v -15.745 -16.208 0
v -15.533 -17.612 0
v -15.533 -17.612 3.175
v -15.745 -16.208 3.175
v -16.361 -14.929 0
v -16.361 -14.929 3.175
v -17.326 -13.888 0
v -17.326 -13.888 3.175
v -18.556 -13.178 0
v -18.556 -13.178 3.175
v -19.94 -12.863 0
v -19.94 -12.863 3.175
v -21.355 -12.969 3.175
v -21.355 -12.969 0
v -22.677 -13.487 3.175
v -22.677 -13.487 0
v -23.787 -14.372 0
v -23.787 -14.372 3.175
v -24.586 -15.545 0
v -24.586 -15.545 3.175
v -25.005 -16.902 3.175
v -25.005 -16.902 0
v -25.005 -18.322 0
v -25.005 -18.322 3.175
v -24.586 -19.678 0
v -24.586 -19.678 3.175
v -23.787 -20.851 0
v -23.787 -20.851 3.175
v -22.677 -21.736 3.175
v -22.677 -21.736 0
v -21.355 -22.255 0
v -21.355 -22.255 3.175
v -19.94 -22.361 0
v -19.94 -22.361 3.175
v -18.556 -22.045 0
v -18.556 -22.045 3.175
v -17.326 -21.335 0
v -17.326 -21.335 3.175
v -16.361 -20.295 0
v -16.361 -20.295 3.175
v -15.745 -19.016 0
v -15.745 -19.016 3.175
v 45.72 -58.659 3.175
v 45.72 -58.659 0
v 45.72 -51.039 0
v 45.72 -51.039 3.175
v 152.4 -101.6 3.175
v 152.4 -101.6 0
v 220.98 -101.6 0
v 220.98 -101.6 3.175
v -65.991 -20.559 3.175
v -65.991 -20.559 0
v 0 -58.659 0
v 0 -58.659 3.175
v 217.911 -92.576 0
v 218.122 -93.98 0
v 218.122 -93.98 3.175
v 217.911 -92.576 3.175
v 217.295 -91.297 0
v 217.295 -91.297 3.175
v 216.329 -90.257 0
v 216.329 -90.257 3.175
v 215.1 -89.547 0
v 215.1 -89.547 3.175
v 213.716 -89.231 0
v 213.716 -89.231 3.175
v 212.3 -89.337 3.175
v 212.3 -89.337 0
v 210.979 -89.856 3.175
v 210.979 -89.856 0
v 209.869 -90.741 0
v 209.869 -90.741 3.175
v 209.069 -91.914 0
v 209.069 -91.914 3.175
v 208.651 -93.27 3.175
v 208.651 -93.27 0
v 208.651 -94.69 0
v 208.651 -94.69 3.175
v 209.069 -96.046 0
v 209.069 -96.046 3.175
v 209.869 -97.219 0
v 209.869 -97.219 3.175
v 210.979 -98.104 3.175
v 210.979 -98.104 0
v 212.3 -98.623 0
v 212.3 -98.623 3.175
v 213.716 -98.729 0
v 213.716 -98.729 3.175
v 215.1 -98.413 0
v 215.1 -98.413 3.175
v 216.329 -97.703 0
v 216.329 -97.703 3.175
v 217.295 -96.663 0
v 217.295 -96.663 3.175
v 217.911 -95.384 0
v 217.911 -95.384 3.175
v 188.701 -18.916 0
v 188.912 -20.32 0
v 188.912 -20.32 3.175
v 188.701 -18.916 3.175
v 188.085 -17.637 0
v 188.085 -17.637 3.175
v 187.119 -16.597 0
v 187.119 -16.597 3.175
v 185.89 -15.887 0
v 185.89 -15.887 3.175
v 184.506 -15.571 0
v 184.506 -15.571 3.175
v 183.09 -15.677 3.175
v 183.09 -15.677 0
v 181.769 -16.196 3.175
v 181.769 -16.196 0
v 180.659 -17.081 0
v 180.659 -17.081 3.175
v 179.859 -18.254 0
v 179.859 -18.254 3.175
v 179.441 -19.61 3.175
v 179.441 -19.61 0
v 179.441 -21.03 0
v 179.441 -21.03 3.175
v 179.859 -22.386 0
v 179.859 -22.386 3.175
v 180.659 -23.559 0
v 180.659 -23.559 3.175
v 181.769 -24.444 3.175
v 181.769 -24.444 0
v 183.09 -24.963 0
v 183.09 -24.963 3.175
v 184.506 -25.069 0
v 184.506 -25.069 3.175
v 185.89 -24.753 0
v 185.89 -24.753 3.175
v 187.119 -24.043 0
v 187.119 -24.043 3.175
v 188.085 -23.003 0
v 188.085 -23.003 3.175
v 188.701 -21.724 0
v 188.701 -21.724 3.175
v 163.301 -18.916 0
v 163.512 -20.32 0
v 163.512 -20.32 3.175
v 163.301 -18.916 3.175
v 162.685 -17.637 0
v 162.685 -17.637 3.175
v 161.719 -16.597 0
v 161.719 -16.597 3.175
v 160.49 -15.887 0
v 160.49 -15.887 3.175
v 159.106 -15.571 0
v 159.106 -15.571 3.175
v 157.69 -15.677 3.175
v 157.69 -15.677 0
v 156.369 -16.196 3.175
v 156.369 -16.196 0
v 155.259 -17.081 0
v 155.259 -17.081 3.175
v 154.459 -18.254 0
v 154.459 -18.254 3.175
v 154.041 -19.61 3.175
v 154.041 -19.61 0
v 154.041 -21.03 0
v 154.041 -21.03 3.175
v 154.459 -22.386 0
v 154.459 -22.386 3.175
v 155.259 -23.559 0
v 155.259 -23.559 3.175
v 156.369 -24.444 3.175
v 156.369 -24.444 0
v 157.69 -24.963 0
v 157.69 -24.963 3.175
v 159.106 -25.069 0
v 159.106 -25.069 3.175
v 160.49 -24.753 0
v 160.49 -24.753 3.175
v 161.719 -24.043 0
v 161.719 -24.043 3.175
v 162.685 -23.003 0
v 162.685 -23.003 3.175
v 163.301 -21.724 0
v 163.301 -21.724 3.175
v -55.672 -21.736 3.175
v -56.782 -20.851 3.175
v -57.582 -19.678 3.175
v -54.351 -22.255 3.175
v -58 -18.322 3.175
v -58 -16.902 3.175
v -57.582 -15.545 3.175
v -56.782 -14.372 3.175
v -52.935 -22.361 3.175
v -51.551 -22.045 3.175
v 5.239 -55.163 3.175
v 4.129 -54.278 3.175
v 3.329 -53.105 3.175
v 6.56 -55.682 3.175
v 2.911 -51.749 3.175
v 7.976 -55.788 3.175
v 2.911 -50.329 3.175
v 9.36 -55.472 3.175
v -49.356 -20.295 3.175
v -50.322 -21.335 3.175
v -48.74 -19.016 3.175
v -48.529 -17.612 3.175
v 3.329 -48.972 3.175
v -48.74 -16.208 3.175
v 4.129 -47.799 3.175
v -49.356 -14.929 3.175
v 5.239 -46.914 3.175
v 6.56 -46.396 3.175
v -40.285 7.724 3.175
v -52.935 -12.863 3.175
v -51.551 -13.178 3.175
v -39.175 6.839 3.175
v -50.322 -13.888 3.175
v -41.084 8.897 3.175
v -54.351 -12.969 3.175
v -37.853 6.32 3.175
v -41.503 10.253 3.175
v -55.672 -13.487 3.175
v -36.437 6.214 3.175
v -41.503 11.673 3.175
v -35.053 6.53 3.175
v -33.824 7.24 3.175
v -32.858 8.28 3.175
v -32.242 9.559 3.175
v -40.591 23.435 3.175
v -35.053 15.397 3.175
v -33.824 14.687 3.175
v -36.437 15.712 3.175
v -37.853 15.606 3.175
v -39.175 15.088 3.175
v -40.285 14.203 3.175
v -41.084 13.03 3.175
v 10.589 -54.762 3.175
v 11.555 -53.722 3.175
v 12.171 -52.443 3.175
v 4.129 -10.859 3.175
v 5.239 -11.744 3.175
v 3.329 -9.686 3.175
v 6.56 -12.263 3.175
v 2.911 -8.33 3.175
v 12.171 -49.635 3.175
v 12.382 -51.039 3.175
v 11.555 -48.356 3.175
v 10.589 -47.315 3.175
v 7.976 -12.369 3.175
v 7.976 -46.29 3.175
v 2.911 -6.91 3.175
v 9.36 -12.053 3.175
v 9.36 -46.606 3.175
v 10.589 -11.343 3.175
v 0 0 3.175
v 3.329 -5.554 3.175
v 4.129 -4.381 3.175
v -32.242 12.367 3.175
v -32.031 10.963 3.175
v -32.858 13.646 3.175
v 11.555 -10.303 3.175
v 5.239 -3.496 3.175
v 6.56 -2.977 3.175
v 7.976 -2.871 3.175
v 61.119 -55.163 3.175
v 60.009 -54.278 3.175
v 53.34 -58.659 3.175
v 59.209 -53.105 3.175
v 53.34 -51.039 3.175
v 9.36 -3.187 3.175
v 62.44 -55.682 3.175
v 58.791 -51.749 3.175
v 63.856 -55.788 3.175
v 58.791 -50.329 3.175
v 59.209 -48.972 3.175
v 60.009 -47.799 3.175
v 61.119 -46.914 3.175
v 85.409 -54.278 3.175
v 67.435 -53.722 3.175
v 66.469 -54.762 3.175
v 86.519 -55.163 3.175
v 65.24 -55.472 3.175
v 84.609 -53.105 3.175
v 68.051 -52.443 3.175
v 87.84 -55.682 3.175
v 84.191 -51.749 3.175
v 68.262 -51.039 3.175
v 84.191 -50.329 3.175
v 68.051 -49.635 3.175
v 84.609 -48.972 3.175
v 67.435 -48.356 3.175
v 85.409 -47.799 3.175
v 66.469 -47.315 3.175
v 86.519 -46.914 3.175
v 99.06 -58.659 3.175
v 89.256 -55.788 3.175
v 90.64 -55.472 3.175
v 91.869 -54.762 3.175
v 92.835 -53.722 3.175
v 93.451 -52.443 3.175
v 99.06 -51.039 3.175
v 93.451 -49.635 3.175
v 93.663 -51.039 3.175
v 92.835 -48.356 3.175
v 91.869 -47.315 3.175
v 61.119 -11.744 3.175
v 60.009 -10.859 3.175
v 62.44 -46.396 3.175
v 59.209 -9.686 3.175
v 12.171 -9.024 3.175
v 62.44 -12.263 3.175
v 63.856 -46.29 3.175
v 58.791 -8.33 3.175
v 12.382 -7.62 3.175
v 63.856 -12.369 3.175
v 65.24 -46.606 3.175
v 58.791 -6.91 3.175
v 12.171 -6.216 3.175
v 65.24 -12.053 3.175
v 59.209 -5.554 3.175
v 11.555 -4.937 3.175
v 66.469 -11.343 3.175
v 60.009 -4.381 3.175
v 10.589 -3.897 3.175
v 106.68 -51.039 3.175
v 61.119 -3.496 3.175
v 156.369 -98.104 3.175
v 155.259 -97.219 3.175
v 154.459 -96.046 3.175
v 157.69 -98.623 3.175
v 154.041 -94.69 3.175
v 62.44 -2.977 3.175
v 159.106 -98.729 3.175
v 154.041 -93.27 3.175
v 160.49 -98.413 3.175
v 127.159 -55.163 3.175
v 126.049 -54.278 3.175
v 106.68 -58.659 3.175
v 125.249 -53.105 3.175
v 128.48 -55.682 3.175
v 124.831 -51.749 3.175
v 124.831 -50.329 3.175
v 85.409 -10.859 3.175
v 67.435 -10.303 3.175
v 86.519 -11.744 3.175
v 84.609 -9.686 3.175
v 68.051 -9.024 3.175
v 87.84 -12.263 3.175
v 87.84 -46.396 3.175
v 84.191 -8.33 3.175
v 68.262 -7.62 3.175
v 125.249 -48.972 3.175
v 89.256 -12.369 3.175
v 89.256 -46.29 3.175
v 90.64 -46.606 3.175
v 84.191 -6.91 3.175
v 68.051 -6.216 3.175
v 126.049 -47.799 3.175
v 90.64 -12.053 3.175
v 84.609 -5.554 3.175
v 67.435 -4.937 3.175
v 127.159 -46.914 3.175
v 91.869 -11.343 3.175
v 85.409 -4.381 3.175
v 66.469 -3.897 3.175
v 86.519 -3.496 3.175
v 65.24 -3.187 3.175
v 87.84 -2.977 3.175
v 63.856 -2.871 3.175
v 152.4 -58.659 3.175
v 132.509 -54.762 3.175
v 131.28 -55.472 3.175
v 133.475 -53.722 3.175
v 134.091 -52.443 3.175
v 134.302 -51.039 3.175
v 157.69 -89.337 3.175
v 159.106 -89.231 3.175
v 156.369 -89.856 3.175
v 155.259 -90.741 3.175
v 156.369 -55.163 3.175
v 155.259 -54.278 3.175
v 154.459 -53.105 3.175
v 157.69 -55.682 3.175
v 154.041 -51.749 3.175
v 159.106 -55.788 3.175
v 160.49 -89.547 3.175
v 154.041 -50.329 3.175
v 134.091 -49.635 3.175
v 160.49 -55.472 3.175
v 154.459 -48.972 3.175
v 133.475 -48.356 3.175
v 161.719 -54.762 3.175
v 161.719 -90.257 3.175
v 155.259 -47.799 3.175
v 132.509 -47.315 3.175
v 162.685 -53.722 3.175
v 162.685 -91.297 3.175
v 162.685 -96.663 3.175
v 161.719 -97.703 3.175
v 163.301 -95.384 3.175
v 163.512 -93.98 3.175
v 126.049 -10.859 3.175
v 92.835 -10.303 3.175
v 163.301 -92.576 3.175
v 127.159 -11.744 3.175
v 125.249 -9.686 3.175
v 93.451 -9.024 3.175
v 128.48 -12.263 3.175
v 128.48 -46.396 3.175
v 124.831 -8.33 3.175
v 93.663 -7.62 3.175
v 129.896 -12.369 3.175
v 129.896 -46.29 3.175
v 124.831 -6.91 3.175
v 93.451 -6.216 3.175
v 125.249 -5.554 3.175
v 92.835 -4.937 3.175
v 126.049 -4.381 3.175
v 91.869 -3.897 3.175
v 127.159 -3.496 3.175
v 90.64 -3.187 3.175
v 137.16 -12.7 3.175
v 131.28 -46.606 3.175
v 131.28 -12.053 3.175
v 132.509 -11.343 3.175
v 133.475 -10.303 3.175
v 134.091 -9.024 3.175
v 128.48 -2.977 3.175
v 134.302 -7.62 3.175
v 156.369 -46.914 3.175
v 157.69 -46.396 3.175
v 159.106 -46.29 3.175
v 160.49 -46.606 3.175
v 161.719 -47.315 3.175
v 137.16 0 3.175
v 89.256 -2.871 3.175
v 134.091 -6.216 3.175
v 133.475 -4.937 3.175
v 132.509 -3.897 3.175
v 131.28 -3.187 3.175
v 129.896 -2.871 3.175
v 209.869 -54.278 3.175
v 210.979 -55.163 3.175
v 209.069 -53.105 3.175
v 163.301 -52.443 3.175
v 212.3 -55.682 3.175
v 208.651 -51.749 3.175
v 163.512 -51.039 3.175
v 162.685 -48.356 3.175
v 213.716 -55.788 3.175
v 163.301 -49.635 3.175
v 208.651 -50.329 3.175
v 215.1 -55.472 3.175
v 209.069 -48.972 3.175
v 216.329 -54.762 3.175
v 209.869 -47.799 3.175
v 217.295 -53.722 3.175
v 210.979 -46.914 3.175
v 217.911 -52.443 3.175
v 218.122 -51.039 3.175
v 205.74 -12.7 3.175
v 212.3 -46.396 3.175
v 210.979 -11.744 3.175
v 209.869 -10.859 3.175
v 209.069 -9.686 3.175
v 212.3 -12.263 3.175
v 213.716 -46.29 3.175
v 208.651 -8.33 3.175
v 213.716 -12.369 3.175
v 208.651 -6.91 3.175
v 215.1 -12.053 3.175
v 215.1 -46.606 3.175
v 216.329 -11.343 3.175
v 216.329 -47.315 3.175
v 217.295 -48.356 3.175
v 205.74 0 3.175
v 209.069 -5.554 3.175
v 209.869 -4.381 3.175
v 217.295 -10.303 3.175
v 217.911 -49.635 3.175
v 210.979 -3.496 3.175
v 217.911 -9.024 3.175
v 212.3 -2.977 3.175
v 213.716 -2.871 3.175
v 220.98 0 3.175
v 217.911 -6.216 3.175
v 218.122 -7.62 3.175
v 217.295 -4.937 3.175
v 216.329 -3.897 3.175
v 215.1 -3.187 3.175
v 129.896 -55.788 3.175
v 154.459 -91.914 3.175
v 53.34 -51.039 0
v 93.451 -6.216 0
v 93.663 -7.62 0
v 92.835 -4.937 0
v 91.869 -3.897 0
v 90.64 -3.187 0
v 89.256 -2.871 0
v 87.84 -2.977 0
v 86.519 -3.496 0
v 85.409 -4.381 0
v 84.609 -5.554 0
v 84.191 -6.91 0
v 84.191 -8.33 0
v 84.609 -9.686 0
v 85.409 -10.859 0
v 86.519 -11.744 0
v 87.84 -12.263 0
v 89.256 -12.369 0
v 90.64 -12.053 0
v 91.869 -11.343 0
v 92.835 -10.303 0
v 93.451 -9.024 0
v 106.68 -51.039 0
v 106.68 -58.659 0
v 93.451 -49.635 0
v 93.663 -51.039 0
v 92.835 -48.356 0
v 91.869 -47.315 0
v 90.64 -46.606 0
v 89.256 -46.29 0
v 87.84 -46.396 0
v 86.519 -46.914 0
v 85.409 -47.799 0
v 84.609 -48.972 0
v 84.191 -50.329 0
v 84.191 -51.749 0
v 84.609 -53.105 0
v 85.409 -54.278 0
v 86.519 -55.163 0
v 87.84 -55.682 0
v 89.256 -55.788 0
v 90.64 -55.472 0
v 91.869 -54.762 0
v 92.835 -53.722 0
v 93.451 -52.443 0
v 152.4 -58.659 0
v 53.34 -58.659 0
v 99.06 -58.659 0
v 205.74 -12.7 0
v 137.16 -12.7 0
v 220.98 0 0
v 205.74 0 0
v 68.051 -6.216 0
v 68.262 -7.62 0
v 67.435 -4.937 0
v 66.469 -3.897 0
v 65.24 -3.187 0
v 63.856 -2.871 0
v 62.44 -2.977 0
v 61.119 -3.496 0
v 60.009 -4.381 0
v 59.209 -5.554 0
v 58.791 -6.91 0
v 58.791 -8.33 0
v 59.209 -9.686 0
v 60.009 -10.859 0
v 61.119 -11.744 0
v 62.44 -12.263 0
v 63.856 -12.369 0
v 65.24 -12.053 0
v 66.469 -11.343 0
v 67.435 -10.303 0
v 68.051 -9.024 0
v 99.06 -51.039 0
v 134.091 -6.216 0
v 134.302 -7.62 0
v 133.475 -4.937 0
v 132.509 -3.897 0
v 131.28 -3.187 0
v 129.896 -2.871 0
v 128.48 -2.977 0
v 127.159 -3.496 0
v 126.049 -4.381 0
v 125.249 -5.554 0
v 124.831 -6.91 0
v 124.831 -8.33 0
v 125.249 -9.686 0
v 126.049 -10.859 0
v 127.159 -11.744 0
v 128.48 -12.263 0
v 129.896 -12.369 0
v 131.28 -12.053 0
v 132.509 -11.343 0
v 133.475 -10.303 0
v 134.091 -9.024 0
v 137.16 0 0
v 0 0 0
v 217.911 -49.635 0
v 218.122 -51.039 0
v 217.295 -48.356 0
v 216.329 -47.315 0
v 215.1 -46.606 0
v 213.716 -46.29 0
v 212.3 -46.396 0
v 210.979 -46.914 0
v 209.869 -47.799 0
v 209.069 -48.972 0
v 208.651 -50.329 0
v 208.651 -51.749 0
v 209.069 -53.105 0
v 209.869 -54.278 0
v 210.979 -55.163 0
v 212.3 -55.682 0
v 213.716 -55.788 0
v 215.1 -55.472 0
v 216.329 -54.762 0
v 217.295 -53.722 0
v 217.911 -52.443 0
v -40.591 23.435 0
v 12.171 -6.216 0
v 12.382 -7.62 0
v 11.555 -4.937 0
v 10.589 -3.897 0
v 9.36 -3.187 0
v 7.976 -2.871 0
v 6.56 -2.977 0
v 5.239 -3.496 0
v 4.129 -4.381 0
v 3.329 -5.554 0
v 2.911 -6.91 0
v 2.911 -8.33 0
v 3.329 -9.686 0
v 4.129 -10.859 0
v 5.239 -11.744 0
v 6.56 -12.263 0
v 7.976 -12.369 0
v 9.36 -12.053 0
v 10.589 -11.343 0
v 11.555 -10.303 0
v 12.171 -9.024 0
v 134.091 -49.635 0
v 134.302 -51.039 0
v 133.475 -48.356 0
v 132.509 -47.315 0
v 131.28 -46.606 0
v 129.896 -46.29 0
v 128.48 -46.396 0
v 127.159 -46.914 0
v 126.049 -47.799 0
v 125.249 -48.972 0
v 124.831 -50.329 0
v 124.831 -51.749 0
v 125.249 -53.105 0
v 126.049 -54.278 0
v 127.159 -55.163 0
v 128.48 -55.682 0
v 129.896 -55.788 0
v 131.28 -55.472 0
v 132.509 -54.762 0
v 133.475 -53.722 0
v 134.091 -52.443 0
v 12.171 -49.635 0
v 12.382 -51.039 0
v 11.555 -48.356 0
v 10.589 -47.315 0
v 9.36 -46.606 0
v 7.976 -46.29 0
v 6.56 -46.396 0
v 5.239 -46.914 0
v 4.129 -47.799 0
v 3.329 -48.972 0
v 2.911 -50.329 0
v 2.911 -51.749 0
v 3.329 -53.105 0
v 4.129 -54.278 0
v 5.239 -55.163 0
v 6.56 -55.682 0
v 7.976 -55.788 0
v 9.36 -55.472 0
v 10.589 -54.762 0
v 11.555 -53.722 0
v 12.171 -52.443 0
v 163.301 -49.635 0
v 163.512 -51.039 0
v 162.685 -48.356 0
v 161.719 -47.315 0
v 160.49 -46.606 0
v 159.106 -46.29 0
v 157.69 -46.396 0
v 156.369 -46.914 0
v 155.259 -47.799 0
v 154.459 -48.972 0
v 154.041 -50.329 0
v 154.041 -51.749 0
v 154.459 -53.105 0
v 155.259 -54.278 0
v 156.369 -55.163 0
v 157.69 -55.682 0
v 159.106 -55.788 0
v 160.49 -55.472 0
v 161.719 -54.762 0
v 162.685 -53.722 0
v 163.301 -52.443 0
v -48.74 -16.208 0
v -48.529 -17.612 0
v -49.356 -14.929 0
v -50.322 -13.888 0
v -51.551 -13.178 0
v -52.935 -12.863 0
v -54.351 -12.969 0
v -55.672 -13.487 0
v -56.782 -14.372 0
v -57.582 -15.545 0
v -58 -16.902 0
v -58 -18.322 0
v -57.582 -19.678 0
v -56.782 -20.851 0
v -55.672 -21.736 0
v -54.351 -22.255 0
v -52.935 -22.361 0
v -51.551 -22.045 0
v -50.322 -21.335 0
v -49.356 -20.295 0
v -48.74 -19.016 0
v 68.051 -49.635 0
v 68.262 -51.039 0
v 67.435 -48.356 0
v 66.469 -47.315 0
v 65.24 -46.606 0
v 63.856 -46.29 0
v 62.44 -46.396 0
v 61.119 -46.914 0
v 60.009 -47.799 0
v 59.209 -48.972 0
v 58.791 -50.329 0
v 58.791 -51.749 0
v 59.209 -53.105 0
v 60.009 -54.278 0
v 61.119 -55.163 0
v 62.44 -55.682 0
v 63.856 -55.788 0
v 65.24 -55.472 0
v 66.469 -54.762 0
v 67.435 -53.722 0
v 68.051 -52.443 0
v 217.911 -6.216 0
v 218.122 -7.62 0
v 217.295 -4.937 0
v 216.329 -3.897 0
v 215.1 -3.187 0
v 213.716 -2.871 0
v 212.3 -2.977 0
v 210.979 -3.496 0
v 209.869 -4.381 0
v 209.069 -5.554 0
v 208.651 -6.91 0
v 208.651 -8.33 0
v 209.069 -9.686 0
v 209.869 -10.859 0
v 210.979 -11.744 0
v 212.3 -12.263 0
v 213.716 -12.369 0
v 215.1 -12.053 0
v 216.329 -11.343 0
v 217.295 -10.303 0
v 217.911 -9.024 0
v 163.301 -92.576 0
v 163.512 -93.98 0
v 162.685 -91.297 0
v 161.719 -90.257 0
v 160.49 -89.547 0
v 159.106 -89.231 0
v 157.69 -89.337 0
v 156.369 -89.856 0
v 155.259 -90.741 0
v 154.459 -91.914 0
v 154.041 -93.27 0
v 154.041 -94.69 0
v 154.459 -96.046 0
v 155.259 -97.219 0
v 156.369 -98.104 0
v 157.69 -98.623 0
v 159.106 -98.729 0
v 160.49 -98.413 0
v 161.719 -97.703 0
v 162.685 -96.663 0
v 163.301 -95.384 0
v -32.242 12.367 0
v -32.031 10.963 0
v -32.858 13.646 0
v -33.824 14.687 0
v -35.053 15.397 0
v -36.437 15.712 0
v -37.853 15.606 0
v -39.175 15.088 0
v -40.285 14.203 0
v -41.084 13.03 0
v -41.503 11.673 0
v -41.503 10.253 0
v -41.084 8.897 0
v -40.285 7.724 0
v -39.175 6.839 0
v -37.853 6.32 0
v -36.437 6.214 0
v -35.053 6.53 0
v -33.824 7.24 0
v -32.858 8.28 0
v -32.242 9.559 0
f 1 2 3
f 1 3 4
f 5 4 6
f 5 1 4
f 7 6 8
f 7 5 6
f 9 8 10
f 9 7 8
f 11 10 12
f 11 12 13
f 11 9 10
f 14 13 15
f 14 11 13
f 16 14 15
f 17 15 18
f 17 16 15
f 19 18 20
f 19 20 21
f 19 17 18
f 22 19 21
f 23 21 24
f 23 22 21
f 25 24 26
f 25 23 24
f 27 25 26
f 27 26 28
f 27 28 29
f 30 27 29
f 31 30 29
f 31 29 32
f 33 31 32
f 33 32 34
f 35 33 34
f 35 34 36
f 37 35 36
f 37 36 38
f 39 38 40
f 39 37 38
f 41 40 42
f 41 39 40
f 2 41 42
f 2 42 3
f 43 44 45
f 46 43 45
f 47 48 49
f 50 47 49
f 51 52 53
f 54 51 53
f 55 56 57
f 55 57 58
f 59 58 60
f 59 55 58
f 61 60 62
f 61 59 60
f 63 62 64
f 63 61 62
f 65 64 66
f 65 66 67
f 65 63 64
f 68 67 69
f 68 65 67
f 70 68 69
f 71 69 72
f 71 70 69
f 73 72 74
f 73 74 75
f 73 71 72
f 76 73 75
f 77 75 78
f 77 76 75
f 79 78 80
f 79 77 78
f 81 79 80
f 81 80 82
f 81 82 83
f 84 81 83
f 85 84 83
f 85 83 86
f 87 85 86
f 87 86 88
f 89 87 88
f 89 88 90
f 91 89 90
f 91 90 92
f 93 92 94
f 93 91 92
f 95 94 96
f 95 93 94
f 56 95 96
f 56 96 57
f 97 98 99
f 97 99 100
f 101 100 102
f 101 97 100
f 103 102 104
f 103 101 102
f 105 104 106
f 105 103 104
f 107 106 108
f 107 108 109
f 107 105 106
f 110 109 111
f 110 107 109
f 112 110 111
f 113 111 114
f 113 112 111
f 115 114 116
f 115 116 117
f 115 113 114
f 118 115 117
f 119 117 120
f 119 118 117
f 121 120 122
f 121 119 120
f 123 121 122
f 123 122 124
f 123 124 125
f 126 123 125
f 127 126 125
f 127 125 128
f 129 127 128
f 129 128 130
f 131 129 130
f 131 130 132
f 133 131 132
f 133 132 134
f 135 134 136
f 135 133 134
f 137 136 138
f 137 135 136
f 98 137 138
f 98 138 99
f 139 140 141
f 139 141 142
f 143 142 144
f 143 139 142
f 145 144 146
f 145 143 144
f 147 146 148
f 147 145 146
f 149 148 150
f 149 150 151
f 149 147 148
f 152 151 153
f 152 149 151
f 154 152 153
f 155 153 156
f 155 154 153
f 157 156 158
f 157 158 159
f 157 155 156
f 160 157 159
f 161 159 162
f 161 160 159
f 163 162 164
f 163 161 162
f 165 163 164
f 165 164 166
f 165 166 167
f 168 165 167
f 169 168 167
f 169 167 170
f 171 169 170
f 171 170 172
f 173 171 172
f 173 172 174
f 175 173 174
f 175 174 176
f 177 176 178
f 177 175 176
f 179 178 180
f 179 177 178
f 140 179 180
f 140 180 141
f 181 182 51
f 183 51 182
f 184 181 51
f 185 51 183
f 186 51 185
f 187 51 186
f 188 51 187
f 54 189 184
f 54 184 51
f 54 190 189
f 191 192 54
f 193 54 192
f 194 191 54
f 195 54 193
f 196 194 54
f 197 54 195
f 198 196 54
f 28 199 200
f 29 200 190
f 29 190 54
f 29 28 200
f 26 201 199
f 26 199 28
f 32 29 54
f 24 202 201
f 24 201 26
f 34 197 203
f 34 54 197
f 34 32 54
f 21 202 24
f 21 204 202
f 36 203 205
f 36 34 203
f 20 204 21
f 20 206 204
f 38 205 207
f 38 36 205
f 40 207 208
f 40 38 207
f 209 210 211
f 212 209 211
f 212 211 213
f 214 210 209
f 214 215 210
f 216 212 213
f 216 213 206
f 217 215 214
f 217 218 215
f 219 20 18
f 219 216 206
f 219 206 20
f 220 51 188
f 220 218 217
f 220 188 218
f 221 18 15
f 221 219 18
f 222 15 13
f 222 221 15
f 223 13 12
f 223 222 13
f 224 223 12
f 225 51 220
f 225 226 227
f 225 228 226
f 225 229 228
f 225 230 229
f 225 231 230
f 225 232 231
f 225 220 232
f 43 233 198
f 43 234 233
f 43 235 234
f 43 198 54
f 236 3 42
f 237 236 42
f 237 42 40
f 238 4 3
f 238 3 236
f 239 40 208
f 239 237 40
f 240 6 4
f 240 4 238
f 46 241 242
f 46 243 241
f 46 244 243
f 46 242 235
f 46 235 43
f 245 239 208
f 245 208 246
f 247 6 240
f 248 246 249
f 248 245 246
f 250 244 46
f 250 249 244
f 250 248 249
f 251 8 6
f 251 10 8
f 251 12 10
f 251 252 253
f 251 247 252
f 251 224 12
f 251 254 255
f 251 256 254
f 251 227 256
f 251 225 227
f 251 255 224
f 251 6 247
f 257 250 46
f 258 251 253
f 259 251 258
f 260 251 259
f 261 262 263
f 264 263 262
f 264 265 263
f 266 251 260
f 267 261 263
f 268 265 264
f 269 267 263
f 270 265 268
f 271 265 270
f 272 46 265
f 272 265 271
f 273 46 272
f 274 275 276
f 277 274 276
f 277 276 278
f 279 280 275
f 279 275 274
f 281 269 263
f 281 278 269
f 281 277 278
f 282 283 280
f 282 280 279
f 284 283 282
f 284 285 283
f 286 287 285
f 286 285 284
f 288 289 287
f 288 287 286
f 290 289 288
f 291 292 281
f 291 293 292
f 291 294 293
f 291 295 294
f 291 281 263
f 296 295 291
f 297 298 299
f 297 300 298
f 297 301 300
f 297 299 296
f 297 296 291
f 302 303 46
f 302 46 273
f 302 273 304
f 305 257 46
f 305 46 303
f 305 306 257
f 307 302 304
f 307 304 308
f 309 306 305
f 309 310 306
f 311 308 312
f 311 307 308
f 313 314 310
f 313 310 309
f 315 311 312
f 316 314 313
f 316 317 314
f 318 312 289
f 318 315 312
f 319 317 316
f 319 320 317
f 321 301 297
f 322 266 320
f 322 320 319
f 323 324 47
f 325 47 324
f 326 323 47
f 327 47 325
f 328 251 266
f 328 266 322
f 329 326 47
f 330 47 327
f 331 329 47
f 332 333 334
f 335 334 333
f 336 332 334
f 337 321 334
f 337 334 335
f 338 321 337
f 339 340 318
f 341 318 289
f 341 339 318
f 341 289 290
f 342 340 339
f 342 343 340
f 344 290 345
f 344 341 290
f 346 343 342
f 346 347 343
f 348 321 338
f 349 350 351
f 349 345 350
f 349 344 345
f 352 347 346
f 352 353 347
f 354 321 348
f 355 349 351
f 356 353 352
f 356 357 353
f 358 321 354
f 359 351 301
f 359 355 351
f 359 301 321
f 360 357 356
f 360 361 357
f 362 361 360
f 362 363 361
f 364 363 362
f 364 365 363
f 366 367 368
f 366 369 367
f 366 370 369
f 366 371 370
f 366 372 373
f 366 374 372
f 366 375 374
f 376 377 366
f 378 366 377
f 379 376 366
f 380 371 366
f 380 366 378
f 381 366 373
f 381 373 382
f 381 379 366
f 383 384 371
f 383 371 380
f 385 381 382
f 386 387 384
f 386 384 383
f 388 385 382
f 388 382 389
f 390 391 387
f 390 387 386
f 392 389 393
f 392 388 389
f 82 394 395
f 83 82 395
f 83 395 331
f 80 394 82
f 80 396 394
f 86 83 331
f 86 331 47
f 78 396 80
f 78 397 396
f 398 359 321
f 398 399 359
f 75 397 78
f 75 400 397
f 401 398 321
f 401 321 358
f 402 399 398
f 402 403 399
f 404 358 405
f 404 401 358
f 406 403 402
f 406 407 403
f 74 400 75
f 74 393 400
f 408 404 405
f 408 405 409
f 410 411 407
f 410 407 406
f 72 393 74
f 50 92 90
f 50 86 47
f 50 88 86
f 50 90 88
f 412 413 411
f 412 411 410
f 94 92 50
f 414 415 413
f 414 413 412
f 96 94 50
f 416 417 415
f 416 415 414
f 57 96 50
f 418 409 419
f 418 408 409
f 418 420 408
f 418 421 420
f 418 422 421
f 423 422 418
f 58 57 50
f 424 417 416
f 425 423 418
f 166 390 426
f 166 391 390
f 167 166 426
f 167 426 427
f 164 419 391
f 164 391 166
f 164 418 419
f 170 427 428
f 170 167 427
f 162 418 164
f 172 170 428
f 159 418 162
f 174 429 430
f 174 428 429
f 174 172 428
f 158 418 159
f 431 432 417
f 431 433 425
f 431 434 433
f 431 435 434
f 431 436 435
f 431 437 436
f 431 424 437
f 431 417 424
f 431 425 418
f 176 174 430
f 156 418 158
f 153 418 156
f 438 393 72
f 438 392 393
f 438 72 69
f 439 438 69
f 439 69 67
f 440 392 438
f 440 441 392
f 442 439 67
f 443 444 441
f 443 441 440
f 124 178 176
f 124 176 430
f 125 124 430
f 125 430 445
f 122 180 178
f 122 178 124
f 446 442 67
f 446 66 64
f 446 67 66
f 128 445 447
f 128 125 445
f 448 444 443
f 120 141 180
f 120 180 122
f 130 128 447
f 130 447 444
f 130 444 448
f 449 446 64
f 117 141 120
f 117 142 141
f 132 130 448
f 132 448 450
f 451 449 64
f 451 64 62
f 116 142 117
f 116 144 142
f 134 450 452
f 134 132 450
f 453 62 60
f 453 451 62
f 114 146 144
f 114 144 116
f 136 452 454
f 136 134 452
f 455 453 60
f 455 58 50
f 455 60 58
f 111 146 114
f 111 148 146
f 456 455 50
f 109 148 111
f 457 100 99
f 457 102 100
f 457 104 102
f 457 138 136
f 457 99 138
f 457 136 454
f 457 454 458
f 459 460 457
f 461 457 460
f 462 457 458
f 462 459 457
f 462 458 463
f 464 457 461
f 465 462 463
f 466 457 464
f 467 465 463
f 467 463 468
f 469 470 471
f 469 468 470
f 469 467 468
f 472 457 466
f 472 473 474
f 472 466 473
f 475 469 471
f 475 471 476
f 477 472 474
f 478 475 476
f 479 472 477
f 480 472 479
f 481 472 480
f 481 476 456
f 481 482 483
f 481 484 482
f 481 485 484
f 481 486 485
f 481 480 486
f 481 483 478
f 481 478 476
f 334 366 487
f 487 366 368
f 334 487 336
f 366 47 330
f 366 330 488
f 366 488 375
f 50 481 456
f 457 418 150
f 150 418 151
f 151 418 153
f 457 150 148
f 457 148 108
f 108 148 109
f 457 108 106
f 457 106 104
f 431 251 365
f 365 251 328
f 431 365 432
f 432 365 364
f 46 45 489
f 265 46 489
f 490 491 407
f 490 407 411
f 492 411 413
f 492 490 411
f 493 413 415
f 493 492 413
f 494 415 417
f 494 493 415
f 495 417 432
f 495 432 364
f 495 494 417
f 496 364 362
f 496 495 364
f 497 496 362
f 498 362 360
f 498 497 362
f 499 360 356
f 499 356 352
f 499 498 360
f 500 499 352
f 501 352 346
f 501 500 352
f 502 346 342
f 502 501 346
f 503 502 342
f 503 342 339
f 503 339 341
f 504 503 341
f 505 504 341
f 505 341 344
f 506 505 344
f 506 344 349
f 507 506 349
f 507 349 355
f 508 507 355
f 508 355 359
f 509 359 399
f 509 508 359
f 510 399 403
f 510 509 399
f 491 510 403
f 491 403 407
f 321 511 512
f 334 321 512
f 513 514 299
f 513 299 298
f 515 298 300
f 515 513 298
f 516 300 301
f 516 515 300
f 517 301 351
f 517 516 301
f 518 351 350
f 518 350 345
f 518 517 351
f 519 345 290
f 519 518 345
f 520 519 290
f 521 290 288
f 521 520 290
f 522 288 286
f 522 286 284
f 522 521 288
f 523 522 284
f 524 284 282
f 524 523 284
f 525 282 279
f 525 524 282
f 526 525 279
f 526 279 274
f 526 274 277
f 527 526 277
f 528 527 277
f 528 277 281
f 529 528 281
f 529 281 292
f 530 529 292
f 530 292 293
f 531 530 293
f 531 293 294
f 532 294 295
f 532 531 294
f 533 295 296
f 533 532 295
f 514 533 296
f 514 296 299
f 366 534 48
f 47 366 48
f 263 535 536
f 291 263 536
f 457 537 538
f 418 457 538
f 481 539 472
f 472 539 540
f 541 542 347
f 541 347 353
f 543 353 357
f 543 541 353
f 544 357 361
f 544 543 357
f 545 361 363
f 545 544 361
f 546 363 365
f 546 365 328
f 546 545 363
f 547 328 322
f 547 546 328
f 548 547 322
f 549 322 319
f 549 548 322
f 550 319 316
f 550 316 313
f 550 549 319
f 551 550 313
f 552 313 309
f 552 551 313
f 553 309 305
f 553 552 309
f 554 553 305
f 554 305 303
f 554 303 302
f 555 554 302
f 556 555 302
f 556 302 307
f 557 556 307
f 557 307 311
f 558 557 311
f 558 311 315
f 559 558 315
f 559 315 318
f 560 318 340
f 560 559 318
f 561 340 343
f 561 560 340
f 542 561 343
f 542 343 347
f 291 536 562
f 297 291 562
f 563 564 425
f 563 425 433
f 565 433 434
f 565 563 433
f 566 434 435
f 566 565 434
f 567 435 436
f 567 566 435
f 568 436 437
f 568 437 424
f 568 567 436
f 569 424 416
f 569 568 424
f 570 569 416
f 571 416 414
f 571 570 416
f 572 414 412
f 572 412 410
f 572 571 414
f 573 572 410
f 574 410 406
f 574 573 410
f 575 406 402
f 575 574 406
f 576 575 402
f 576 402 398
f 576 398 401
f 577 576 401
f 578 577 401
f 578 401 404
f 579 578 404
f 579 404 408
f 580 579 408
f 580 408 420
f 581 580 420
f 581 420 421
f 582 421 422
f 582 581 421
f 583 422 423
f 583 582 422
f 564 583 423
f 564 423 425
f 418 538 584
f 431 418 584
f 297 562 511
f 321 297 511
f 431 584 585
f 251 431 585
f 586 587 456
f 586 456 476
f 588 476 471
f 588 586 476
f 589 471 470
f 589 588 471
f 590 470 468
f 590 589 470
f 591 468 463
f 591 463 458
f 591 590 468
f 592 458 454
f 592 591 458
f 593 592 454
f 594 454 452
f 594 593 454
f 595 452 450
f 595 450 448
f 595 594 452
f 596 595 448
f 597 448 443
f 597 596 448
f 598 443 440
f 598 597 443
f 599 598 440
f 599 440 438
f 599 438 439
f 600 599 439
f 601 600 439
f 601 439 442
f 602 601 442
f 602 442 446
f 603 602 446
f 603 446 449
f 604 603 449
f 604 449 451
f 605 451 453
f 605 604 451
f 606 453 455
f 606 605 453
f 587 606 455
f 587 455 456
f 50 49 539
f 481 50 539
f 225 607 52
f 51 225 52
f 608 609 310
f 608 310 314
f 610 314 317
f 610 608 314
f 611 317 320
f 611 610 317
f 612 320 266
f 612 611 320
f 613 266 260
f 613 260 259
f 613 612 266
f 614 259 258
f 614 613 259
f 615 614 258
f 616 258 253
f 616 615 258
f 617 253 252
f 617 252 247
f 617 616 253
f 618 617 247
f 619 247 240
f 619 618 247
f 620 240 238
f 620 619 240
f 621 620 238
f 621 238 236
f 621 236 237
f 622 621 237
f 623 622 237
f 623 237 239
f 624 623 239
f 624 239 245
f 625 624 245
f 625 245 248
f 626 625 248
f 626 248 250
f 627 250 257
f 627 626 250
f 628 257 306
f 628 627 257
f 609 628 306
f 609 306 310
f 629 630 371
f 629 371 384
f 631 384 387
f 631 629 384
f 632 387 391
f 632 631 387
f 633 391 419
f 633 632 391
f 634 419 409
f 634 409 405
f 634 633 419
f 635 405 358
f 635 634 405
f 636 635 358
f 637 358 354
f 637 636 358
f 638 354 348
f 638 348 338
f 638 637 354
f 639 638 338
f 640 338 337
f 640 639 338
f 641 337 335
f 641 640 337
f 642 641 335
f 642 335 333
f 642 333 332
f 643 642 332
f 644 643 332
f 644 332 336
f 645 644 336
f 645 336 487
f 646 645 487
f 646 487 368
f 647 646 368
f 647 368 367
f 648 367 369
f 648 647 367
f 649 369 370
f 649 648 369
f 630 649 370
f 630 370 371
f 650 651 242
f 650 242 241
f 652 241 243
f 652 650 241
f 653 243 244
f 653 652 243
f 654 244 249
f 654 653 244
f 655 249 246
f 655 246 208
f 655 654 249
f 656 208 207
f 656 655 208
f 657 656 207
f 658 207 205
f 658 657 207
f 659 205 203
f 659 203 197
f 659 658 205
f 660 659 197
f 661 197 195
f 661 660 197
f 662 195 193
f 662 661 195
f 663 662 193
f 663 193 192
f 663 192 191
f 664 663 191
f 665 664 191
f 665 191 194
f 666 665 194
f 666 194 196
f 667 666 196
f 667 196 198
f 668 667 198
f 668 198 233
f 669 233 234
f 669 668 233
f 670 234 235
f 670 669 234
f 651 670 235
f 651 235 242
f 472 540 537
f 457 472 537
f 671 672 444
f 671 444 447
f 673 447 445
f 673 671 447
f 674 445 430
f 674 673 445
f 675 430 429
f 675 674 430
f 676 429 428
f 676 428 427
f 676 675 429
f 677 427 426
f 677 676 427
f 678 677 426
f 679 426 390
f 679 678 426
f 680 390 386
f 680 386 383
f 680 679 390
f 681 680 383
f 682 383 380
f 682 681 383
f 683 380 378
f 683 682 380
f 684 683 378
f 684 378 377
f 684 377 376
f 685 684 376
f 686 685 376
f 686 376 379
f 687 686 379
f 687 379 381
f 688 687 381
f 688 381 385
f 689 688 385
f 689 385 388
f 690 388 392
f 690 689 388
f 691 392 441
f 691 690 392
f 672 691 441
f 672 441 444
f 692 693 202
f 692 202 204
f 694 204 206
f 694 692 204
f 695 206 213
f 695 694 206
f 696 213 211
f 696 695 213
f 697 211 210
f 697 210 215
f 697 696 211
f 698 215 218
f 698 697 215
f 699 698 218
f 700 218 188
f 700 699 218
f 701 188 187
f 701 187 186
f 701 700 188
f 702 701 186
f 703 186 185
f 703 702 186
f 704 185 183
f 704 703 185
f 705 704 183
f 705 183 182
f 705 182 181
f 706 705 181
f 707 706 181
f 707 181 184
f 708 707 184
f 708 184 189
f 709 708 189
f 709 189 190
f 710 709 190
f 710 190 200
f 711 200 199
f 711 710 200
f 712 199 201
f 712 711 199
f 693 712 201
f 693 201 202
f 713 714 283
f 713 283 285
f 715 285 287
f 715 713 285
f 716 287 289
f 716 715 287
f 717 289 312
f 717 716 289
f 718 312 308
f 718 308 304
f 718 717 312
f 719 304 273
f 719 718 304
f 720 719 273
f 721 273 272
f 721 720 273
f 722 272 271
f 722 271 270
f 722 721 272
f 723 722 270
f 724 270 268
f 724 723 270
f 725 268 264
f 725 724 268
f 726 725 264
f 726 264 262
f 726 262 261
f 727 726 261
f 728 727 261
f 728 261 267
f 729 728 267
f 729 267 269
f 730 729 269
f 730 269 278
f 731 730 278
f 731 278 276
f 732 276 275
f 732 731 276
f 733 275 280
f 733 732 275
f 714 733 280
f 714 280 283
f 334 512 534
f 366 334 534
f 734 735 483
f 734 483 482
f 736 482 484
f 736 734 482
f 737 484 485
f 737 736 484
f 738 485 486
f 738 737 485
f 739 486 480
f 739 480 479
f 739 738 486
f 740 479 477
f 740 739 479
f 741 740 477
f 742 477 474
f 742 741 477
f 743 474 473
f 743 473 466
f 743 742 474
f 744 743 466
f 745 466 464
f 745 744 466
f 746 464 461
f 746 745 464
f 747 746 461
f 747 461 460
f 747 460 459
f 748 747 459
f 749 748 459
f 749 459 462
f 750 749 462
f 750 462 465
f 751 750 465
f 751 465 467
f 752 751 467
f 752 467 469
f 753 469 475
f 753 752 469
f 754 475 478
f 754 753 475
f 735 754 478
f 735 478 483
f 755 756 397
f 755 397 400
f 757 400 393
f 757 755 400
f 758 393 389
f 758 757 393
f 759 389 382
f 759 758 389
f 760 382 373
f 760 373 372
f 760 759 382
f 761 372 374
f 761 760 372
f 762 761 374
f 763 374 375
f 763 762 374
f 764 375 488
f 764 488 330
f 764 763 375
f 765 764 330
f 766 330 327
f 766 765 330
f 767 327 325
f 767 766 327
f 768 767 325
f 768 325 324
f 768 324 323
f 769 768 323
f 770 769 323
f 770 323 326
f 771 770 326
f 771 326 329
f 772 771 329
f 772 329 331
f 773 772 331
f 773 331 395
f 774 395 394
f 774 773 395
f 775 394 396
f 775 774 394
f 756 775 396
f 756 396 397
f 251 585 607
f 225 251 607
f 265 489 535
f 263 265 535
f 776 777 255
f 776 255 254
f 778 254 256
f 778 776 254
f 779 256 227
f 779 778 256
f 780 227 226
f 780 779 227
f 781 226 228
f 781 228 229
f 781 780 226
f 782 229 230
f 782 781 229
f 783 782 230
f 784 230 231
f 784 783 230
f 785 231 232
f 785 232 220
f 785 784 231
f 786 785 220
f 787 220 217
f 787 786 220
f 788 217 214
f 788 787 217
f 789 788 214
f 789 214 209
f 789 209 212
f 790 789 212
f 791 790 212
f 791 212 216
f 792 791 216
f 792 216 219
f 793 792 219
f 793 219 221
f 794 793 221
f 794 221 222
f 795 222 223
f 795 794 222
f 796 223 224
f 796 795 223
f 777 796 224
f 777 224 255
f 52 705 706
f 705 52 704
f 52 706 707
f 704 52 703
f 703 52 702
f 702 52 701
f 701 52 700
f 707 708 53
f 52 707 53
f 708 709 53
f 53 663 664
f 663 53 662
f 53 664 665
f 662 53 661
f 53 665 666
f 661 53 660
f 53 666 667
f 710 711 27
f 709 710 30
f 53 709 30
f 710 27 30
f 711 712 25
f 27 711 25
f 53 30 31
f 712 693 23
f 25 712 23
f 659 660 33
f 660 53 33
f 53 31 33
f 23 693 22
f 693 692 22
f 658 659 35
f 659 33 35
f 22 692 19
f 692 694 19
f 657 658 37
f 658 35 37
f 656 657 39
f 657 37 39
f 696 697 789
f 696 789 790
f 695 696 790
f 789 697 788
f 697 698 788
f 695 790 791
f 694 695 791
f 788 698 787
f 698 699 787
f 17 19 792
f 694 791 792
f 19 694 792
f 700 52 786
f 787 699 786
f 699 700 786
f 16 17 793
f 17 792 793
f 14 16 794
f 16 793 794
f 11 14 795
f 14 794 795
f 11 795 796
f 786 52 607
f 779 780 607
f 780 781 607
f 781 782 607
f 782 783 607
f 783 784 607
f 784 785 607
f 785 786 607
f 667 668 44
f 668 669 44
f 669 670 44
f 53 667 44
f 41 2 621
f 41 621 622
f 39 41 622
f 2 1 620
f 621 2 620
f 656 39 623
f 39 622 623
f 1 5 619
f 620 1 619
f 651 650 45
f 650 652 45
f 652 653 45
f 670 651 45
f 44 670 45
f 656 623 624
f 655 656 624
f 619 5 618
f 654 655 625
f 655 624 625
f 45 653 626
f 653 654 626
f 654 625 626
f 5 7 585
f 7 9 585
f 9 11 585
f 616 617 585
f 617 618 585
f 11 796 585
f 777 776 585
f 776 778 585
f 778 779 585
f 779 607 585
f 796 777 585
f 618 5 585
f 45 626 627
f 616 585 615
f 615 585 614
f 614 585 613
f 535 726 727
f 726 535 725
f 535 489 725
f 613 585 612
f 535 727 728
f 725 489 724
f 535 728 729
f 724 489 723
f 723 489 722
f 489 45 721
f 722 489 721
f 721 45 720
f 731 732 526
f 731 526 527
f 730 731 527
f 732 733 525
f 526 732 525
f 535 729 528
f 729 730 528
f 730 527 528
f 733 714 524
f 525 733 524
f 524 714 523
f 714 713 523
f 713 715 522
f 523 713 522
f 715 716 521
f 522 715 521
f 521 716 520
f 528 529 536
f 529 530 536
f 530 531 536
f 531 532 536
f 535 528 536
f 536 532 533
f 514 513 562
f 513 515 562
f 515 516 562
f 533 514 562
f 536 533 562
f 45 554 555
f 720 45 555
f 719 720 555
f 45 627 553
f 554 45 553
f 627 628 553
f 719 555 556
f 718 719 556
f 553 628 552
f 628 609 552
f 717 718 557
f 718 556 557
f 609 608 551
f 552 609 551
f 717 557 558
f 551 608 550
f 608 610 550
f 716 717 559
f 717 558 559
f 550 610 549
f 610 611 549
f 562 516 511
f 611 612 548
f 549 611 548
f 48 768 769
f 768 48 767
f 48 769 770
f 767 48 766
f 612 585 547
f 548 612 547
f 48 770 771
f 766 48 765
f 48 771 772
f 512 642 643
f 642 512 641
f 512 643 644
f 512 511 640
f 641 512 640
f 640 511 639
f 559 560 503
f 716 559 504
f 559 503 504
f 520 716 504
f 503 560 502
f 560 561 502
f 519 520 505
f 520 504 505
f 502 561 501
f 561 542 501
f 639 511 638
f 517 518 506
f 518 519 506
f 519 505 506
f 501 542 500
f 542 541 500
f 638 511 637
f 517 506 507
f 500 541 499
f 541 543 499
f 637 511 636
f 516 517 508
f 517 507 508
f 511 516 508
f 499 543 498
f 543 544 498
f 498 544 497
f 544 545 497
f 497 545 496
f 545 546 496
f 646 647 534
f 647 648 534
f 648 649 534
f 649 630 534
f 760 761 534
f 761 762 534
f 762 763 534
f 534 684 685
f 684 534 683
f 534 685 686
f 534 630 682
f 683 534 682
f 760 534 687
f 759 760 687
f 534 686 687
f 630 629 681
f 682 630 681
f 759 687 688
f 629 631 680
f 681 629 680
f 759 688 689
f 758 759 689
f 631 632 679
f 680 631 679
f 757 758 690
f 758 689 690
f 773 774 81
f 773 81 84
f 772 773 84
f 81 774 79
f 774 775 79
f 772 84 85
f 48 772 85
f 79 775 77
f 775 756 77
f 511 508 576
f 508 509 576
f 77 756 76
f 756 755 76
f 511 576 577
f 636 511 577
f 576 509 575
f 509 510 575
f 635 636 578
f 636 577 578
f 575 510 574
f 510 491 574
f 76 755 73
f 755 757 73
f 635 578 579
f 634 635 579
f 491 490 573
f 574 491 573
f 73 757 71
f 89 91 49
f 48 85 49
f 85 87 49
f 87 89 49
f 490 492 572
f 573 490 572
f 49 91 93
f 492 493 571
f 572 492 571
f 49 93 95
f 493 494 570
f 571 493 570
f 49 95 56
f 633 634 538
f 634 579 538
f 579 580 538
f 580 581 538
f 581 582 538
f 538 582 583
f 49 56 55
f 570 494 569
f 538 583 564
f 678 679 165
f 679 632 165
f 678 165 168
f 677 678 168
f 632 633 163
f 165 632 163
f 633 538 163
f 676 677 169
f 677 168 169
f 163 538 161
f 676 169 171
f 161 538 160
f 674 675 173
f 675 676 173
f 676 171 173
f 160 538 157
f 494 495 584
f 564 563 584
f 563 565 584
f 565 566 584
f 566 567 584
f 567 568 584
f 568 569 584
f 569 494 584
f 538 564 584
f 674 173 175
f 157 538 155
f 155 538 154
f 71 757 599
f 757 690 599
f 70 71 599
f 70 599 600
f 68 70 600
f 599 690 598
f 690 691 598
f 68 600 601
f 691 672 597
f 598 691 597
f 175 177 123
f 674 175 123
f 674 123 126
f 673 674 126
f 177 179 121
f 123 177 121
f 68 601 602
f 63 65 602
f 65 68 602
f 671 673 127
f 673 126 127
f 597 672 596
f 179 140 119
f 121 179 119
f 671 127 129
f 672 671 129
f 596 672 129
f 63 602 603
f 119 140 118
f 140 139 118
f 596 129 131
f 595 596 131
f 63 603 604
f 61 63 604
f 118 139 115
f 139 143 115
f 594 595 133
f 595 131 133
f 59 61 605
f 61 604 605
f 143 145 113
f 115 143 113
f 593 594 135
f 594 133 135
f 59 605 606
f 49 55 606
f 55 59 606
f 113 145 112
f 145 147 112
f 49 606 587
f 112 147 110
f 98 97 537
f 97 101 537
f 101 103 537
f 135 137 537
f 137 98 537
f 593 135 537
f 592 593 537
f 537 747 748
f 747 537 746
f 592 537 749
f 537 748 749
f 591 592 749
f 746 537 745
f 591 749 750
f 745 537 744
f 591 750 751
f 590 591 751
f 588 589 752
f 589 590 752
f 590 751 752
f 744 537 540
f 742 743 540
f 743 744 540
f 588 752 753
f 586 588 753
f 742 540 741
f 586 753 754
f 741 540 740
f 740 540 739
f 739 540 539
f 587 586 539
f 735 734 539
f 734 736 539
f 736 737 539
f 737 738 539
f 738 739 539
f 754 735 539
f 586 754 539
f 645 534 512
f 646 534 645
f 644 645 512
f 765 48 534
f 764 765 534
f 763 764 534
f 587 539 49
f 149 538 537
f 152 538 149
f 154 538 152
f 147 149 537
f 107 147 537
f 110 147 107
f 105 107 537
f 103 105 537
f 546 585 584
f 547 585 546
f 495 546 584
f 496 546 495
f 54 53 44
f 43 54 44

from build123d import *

# Parameters (mm, degrees)
SKETCH1_R           = 4.7625
BOSS_EXTRUDE1_DEPTH = 3.175


with BuildPart() as part:
    # Sketch1 → Boss-Extrude1 (new body)
    with BuildSketch(Plane.XY):
        Polygon((0, 0), (-40.591135768, 23.435303163), (-65.991135768, -20.55878735), (0, -58.65878735), (45.72, -58.65878735), (45.72, -51.03878735), (53.34, -51.03878735), (53.34, -58.65878735), (99.06, -58.65878735), (99.06, -51.03878735), (106.68, -51.03878735), (106.68, -58.65878735), (152.4, -58.65878735), (152.4, -101.6), (220.98, -101.6), (220.98, 0), (205.74, 0), (205.74, -12.7), (137.16, -12.7), (137.16, 0), (99.06, 0), align=None)
        with Locations((-20.295567884, -17.611742094)):
            Circle(SKETCH1_R, mode=Mode.SUBTRACT)
        with Locations((-53.291135768, -17.611742094)):
            Circle(SKETCH1_R, mode=Mode.SUBTRACT)
        with Locations((-36.793351826, 10.963257906)):
            Circle(SKETCH1_R, mode=Mode.SUBTRACT)
        with Locations((7.62, -51.03878735)):
            Circle(SKETCH1_R, mode=Mode.SUBTRACT)
        with Locations((7.62, -7.62)):
            Circle(SKETCH1_R, mode=Mode.SUBTRACT)
        with Locations((63.5, -7.62)):
            Circle(SKETCH1_R, mode=Mode.SUBTRACT)
        with Locations((88.9, -7.62)):
            Circle(SKETCH1_R, mode=Mode.SUBTRACT)
        with Locations((129.54, -7.62)):
            Circle(SKETCH1_R, mode=Mode.SUBTRACT)
        with Locations((88.9, -51.03878735)):
            Circle(SKETCH1_R, mode=Mode.SUBTRACT)
        with Locations((63.5, -51.03878735)):
            Circle(SKETCH1_R, mode=Mode.SUBTRACT)
        with Locations((129.54, -51.03878735)):
            Circle(SKETCH1_R, mode=Mode.SUBTRACT)
        with Locations((158.75, -20.32)):
            Circle(SKETCH1_R, mode=Mode.SUBTRACT)
        with Locations((184.15, -20.32)):
            Circle(SKETCH1_R, mode=Mode.SUBTRACT)
        with Locations((213.36, -7.62)):
            Circle(SKETCH1_R, mode=Mode.SUBTRACT)
        with Locations((213.36, -93.98)):
            Circle(SKETCH1_R, mode=Mode.SUBTRACT)
        with Locations((158.75, -93.98)):
            Circle(SKETCH1_R, mode=Mode.SUBTRACT)
        with Locations((213.36, -51.03878735)):
            Circle(SKETCH1_R, mode=Mode.SUBTRACT)
        with Locations((158.75, -51.03878735)):
            Circle(SKETCH1_R, mode=Mode.SUBTRACT)
    extrude(amount=BOSS_EXTRUDE1_DEPTH)


solid = part.part
